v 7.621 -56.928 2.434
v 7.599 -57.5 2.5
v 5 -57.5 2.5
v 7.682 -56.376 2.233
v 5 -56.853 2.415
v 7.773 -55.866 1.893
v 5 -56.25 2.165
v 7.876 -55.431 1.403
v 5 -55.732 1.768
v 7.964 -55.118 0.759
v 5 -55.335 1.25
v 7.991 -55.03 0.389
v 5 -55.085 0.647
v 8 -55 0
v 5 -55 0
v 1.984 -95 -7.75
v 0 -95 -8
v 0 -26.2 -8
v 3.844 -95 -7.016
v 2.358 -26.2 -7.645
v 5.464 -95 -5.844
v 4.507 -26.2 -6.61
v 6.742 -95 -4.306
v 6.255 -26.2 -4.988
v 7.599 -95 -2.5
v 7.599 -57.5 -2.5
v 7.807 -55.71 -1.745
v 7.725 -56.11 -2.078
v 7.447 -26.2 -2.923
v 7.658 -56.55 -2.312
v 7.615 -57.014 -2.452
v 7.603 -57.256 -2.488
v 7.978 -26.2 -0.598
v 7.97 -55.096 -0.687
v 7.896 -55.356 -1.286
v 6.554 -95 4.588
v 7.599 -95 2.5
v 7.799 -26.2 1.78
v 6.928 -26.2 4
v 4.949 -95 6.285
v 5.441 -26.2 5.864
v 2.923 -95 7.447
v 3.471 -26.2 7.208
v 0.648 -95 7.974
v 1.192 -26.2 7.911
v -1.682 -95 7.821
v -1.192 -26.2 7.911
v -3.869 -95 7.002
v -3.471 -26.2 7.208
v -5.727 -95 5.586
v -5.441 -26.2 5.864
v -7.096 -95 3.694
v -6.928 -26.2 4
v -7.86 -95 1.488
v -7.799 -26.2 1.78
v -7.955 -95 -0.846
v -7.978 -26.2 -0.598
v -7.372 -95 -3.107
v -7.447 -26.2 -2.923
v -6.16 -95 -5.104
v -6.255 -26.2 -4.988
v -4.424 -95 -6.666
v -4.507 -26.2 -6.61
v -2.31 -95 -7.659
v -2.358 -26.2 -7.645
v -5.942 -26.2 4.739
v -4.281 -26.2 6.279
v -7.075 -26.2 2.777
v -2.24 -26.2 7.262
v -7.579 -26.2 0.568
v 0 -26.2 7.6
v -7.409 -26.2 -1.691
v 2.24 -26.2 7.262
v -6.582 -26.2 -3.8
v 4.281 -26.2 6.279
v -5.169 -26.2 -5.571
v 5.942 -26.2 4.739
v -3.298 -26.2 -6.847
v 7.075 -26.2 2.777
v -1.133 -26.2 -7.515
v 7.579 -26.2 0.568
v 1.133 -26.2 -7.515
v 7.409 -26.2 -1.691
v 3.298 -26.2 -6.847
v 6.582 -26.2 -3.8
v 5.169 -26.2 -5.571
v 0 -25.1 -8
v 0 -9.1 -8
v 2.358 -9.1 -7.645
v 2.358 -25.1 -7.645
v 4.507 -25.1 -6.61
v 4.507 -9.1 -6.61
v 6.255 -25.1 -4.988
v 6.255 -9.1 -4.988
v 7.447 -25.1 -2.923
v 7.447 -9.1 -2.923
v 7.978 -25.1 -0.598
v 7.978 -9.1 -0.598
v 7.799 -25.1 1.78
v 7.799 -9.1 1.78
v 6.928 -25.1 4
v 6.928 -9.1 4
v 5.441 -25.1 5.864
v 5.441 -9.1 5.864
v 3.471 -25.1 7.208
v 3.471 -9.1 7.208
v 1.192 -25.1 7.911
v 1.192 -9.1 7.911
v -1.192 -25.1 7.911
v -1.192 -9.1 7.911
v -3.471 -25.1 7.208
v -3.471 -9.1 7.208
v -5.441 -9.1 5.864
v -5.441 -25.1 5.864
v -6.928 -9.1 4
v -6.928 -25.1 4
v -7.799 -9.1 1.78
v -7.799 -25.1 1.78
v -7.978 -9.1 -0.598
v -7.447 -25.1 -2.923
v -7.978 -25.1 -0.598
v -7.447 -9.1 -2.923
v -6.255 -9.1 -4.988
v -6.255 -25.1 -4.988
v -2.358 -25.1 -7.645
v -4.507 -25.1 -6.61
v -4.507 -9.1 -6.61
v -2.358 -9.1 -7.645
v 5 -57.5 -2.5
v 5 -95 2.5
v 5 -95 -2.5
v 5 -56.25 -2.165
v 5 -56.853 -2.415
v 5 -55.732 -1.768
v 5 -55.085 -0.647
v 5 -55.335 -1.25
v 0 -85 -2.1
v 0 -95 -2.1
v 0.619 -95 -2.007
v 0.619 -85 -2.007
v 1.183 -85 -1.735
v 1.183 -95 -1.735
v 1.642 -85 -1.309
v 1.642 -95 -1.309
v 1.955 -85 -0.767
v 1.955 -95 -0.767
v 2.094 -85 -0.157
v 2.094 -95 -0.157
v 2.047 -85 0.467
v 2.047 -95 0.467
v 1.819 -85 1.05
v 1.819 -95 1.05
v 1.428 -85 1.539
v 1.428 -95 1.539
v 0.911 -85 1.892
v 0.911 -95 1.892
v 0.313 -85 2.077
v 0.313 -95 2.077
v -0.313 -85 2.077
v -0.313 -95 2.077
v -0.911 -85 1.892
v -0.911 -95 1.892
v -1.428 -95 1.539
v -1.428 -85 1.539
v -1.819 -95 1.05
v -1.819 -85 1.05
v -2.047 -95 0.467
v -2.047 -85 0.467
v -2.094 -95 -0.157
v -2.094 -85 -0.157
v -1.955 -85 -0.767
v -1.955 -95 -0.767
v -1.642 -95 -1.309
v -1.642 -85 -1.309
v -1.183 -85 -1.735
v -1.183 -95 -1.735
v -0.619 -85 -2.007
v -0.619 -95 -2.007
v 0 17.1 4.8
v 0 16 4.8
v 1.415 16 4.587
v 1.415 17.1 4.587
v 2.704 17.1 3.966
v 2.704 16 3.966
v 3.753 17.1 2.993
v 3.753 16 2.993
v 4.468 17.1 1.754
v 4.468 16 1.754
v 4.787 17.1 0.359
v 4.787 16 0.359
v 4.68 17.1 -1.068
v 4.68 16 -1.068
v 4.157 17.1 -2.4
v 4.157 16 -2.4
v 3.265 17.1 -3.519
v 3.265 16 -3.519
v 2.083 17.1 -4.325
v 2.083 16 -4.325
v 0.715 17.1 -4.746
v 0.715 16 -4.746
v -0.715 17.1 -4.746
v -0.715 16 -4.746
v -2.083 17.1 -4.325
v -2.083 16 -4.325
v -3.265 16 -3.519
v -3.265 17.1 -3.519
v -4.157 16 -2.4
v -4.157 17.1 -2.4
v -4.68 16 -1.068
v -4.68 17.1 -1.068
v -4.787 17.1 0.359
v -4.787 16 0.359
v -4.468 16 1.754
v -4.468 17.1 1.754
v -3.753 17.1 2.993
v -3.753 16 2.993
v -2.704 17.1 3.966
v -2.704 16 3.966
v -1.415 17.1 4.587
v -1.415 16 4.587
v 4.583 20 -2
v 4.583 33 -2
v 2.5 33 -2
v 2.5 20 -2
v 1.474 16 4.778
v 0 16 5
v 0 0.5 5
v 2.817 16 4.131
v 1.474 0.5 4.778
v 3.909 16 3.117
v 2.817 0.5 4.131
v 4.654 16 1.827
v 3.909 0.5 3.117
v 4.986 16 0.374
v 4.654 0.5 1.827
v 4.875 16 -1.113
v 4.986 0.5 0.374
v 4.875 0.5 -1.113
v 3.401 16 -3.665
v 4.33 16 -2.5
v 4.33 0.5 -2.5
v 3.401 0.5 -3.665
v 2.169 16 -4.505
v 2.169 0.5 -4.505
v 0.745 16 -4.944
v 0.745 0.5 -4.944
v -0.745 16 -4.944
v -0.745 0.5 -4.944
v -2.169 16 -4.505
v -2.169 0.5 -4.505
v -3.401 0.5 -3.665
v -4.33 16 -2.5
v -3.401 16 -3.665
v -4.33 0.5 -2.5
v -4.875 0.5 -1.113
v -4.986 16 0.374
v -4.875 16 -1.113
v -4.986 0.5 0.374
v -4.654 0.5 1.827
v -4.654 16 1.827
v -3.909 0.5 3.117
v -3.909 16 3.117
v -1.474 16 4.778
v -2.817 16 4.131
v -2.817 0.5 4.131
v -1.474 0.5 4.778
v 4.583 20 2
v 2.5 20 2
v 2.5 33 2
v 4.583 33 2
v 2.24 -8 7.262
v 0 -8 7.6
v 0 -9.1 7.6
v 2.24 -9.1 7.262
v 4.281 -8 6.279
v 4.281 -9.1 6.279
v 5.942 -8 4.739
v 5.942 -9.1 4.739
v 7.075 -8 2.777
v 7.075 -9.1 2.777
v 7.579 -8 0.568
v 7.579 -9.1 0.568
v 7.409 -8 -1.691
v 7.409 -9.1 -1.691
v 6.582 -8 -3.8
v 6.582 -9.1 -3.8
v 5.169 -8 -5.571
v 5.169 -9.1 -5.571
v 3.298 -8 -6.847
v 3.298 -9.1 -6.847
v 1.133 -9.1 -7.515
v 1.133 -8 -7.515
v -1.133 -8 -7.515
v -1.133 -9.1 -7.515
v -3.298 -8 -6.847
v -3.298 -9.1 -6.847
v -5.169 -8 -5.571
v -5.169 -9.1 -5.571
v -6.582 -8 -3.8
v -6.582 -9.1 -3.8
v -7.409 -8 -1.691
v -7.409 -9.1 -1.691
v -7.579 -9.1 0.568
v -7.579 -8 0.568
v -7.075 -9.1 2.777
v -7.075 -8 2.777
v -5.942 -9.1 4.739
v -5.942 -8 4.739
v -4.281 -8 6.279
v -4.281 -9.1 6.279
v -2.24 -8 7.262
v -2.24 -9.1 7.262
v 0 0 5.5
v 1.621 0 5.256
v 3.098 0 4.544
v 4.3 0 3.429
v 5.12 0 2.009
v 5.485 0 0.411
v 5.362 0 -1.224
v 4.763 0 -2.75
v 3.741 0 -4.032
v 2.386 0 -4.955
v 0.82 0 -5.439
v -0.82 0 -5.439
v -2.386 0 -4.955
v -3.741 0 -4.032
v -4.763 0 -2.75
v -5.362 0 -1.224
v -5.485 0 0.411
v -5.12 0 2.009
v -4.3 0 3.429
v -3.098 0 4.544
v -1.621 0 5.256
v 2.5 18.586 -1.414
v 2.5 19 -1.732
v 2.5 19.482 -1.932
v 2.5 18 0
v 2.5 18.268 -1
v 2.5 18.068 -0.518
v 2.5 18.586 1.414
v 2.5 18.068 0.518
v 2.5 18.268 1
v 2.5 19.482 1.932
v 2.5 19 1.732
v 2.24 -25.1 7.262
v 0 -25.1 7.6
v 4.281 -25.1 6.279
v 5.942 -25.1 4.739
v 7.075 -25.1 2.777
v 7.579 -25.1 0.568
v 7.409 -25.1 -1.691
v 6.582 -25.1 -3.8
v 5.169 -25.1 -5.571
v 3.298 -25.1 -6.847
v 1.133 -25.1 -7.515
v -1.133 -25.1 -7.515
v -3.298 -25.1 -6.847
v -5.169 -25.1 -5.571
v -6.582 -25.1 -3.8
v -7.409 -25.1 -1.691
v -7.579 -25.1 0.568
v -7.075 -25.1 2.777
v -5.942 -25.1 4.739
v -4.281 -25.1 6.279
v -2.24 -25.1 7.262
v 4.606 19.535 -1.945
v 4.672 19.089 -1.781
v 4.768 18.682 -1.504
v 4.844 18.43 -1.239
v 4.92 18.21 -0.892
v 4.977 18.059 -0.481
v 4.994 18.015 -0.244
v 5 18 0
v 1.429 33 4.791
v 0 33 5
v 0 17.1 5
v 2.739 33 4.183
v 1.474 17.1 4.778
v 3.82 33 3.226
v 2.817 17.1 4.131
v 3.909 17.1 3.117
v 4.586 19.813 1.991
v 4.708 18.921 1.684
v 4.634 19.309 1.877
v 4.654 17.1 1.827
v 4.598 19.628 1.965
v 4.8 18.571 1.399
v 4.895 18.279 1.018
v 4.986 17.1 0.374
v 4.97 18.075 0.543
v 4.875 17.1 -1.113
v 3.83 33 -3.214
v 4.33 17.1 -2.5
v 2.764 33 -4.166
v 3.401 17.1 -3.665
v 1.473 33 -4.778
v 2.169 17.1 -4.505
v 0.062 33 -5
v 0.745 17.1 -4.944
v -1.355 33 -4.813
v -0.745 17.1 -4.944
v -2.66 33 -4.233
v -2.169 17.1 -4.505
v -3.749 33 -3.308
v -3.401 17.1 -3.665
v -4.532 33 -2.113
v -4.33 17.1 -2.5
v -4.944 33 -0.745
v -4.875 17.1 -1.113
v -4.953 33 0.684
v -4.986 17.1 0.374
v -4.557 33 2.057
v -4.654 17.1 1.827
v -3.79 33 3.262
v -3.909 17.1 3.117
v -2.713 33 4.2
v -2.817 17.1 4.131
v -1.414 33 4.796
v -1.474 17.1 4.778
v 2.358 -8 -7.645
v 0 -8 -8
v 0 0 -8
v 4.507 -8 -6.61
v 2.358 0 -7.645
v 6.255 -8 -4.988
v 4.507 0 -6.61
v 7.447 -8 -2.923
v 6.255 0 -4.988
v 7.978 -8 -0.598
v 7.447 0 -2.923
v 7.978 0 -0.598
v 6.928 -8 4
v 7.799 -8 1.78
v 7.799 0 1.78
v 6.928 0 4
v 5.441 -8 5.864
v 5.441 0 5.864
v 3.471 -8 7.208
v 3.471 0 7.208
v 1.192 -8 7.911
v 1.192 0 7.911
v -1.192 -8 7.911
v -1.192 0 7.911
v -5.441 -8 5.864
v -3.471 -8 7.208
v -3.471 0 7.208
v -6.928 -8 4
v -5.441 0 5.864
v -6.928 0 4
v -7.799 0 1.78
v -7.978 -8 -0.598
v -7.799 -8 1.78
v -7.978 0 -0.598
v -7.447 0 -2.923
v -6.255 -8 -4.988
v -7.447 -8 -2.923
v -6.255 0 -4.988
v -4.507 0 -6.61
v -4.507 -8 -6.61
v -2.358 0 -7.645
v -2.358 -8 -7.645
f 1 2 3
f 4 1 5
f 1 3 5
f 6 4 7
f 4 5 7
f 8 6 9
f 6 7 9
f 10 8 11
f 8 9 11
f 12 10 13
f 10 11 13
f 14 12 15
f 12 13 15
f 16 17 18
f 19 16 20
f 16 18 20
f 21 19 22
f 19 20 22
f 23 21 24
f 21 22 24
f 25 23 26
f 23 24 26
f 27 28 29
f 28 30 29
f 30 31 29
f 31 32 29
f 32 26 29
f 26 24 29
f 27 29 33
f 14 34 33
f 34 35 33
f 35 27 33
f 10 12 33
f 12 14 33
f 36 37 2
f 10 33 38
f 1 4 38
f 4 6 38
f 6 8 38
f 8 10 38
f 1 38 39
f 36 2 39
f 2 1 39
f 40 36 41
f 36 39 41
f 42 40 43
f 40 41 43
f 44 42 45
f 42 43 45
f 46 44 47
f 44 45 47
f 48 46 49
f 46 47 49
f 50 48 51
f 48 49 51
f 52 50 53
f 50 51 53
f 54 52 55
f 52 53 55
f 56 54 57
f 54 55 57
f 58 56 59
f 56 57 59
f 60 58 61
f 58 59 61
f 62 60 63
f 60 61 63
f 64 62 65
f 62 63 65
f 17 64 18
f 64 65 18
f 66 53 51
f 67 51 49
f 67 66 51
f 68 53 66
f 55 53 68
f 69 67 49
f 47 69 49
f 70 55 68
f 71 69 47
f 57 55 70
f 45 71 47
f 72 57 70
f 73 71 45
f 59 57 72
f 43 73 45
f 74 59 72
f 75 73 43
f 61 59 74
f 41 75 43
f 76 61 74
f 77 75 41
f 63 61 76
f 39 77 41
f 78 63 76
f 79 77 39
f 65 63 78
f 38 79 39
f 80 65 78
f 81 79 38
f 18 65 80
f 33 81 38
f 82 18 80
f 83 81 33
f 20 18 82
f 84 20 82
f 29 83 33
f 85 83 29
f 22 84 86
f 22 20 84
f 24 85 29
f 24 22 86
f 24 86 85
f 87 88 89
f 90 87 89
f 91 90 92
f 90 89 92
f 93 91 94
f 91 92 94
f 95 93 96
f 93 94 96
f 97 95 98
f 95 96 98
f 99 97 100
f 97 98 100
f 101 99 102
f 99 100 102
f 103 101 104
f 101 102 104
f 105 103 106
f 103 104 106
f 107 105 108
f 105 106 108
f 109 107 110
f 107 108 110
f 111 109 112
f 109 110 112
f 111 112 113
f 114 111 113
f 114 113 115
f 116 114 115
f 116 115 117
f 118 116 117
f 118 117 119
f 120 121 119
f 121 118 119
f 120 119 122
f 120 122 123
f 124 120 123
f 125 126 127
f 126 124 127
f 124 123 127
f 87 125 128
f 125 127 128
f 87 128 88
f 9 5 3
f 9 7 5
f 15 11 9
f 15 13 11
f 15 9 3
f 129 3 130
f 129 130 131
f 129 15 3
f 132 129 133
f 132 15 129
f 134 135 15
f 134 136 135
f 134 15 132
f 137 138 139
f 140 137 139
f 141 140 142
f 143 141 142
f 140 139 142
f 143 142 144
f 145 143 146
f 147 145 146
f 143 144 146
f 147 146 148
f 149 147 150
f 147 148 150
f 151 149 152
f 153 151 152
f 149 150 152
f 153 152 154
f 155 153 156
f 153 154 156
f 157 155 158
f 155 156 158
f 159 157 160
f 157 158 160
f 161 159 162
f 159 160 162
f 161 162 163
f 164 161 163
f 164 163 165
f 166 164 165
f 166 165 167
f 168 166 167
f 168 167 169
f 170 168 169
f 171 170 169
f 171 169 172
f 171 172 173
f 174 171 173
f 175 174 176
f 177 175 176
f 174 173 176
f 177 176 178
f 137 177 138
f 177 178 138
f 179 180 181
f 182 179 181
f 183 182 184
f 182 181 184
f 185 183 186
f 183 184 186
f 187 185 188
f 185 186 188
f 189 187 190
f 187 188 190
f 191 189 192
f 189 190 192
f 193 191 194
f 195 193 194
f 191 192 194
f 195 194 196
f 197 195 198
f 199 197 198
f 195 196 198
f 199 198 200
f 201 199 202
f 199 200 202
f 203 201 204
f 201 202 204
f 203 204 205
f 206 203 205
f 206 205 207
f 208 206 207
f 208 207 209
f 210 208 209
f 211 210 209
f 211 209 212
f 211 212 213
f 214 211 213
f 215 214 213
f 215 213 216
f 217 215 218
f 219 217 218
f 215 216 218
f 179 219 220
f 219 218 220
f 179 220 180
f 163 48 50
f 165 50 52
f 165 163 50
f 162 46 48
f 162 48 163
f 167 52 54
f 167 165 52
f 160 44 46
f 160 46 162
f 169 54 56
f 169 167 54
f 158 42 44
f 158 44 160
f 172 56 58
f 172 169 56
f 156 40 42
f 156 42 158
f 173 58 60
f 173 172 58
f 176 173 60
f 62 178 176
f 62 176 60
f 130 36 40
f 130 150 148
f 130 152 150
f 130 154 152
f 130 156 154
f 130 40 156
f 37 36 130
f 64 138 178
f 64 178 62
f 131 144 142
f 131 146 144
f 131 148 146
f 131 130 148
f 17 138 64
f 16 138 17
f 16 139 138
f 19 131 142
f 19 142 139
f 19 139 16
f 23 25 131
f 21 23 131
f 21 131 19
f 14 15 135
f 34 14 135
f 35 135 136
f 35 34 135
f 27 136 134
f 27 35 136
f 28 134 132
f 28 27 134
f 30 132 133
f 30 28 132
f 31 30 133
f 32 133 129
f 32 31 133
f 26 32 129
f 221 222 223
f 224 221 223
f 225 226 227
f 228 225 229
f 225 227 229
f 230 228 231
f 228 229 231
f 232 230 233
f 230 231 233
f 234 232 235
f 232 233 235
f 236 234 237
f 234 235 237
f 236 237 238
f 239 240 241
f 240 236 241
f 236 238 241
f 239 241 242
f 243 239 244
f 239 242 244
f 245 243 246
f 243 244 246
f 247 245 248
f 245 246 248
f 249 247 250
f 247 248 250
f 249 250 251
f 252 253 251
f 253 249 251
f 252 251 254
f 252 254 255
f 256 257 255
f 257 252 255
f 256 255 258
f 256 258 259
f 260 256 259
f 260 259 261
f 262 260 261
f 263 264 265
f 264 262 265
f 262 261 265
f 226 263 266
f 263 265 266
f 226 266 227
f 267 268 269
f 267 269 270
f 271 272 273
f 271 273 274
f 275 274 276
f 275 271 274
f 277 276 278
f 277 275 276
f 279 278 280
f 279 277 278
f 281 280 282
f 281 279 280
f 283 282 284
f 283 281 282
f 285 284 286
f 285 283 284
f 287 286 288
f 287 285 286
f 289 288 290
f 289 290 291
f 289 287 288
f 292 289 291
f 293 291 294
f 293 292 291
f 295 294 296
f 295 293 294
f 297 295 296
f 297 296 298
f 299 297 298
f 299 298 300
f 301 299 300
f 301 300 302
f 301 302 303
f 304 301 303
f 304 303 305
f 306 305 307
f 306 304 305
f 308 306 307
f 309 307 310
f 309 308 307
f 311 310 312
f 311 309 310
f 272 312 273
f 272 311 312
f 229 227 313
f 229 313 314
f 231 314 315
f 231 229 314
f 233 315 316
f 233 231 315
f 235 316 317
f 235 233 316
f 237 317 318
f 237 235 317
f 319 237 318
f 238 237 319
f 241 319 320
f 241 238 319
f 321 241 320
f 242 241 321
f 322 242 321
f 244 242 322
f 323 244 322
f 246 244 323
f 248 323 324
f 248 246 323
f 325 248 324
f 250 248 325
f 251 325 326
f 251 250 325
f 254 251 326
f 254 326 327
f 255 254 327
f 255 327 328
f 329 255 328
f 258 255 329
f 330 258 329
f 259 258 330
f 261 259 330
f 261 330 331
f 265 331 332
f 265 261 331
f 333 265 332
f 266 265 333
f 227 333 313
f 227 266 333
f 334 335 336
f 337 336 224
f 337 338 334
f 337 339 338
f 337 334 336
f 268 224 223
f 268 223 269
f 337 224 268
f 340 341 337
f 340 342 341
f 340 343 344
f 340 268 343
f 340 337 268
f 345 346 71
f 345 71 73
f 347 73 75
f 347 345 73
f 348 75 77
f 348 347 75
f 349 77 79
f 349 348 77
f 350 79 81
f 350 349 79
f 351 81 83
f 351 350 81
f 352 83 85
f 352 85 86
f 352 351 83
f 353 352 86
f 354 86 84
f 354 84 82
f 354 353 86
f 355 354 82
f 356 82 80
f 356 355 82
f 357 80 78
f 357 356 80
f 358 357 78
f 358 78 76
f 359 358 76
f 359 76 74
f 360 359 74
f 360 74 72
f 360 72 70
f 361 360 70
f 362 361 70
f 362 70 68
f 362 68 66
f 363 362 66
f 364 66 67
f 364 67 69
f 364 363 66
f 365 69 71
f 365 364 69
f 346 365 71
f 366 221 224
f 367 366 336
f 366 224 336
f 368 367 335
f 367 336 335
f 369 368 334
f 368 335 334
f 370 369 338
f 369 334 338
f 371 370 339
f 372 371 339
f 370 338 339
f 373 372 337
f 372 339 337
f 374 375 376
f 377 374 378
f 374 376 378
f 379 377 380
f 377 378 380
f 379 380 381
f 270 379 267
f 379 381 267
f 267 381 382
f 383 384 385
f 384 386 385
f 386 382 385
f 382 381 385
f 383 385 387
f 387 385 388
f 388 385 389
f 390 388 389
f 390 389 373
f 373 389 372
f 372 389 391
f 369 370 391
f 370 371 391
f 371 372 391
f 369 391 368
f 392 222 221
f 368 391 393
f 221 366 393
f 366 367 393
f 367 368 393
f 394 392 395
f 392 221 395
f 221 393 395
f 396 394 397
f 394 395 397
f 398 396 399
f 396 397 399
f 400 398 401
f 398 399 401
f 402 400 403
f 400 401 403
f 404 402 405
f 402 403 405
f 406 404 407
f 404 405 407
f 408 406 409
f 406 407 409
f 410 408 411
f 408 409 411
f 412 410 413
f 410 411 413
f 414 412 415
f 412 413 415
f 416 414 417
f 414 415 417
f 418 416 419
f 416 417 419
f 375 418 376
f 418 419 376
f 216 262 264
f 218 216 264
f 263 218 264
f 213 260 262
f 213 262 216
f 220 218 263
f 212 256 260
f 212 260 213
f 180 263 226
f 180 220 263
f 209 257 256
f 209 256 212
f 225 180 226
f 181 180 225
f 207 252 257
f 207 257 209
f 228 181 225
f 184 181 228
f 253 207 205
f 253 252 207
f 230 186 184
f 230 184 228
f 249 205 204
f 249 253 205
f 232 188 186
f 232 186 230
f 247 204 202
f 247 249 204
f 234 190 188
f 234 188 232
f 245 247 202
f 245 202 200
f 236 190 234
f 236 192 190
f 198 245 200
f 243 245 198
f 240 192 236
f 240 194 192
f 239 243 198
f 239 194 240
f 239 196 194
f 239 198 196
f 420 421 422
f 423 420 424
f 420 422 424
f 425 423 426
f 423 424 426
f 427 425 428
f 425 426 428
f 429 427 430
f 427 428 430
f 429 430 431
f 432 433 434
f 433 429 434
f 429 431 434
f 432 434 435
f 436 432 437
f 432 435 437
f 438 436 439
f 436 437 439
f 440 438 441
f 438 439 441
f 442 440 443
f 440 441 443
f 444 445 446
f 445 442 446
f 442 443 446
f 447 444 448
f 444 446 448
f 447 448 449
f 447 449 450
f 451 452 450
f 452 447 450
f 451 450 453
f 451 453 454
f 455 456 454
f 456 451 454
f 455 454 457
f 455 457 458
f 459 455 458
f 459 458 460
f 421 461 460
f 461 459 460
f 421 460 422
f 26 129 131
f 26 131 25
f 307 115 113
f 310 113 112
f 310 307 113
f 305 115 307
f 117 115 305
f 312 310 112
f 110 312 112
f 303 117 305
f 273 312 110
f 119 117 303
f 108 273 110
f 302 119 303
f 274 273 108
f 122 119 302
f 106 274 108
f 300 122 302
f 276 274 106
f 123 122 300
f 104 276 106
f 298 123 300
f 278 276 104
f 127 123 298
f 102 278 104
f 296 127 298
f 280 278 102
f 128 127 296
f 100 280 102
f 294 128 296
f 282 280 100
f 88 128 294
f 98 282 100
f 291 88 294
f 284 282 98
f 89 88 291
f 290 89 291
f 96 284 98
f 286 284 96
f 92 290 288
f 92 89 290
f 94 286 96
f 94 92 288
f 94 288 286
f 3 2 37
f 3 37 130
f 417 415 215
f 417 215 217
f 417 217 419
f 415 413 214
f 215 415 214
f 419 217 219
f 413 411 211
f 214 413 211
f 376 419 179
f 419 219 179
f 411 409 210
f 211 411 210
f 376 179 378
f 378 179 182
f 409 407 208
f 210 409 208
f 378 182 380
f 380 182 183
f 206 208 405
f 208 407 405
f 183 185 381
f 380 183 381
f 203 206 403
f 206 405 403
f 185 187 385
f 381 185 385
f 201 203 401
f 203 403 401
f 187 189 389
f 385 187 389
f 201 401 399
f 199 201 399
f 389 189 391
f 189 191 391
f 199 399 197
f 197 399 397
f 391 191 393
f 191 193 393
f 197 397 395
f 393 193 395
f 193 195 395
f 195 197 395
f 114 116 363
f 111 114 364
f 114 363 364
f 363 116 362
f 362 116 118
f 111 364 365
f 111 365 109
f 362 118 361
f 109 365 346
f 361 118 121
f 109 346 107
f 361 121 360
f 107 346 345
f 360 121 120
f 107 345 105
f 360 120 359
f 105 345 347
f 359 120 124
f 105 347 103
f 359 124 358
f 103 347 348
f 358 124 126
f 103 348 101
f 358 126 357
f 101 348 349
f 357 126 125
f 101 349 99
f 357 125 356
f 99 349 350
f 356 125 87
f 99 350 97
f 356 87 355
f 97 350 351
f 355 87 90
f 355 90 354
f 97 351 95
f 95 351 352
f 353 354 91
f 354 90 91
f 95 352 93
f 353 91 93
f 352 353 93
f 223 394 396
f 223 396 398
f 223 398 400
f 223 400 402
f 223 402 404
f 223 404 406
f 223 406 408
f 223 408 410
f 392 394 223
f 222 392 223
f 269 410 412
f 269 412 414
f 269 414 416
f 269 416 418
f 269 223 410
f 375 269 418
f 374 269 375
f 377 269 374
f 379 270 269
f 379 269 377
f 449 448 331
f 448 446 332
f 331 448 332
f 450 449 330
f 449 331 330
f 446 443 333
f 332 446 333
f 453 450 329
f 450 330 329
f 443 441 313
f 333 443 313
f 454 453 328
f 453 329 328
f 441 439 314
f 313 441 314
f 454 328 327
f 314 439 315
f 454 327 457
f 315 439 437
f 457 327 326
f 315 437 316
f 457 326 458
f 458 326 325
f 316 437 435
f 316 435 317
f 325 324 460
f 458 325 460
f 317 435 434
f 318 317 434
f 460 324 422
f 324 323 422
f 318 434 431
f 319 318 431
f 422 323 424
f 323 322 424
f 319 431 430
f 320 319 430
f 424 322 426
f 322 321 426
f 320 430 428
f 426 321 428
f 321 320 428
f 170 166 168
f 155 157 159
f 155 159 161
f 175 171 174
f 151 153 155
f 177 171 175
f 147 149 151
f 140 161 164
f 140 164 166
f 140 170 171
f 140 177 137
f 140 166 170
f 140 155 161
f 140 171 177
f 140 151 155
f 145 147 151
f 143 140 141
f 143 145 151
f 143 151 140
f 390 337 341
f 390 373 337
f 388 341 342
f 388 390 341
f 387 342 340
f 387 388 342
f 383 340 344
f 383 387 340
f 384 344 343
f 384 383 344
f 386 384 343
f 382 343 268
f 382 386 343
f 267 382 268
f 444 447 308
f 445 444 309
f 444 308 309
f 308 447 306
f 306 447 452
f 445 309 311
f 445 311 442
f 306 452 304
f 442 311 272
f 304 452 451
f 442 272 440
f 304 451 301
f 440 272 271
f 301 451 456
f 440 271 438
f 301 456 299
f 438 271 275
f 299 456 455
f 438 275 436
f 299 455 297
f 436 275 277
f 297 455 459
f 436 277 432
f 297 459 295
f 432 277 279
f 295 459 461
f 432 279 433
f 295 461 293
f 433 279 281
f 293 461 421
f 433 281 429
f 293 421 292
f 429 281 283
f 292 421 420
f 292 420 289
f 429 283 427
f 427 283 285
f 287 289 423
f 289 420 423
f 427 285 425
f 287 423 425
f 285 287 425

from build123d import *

# Parameters (mm, degrees)
SKETCH1_R               = 5
BOSS_EXTRUDE1_DEPTH     = 33
SKETCH2_R               = 8
BOSS_EXTRUDE2_DEPTH     = 95
CUT_EXTRUDE1_START      = -8
SKETCH3_OUTSIDE_W       = 43.996
SKETCH3_OUTSIDE_H       = 43.996
SKETCH3_OUTSIDE_R       = 7.6
CUT_EXTRUDE1_DEPTH      = 1.1
CUT_EXTRUDE2_START      = -25.1
SKETCH3_2_OUTSIDE_W     = 43.996
SKETCH3_2_OUTSIDE_H     = 43.996
SKETCH3_2_OUTSIDE_R     = 7.6
CUT_EXTRUDE2_DEPTH      = 1.1
CUT_EXTRUDE3_START      = 16
SKETCH4_OUTSIDE_W       = 43.996
SKETCH4_OUTSIDE_H       = 43.996
SKETCH4_OUTSIDE_R       = 4.8
CUT_EXTRUDE3_DEPTH      = 1.1
SKETCH5_R               = 2.1
CUT_EXTRUDE4_DEPTH      = 10
CUT_EXTRUDE5_START      = -15
CUT_EXTRUDE5_DEPTH      = 15
FILLET1_R               = 2
CUT_EXTRUDE6_DEPTH      = 129.499027333
CUT_EXTRUDE6_DEPTH_BACK = 40
FILLET2_R               = 2.5
CHAMFER1_SIZE           = 0.5


with BuildPart() as part:
    # Sketch1 → Boss-Extrude1 (new body)
    with BuildSketch(Plane(origin=(0, 0, 0), x_dir=(1, 0, 0), z_dir=(0, 1, 0))):
        with Locations(Location((0, 0, 0), (0, 0, 270))):
            Circle(SKETCH1_R)
    extrude(amount=BOSS_EXTRUDE1_DEPTH)

    # Sketch2 → Boss-Extrude2 (add)
    with BuildSketch(Plane.XZ):
        with Locations(Location((0, 0, 0), (0, 0, 270))):
            Circle(SKETCH2_R)
    extrude(amount=BOSS_EXTRUDE2_DEPTH)

    # Sketch3 outside → Cut-Extrude1 (cut)
    with BuildSketch(Plane(origin=(0, 0, 0), x_dir=(1, 0, 0), z_dir=(0, 1, 0)).offset(CUT_EXTRUDE1_START)):
        Rectangle(SKETCH3_OUTSIDE_W, SKETCH3_OUTSIDE_H)
        with Locations(Location((0, 0, 0), (0, 0, 270))):
            Circle(SKETCH3_OUTSIDE_R, mode=Mode.SUBTRACT)
    extrude(amount=-CUT_EXTRUDE1_DEPTH, mode=Mode.SUBTRACT)

    # Sketch3<2> outside → Cut-Extrude2 (cut)
    with BuildSketch(Plane(origin=(0, 0, 0), x_dir=(1, 0, 0), z_dir=(0, 1, 0)).offset(CUT_EXTRUDE2_START)):
        Rectangle(SKETCH3_2_OUTSIDE_W, SKETCH3_2_OUTSIDE_H)
        with Locations(Location((0, 0, 0), (0, 0, 270))):
            Circle(SKETCH3_2_OUTSIDE_R, mode=Mode.SUBTRACT)
    extrude(amount=-CUT_EXTRUDE2_DEPTH, mode=Mode.SUBTRACT)

    # Sketch4 outside → Cut-Extrude3 (cut)
    with BuildSketch(Plane(origin=(0, 0, 0), x_dir=(1, 0, 0), z_dir=(0, 1, 0)).offset(CUT_EXTRUDE3_START)):
        Rectangle(SKETCH4_OUTSIDE_W, SKETCH4_OUTSIDE_H)
        with Locations(Location((0, 0, 0), (0, 0, 270))):
            Circle(SKETCH4_OUTSIDE_R, mode=Mode.SUBTRACT)
    extrude(amount=CUT_EXTRUDE3_DEPTH, mode=Mode.SUBTRACT)

    # Sketch5 → Cut-Extrude4 (cut)
    with BuildSketch(Plane.XZ.offset(95)):
        with Locations(Location((0, 0, 0), (0, 0, 270))):
            Circle(SKETCH5_R)
    extrude(amount=-CUT_EXTRUDE4_DEPTH, mode=Mode.SUBTRACT)

    # Sketch6 → Cut-Extrude5 (cut)
    with BuildSketch(Plane(origin=(0, 33, 0), x_dir=(1, 0, 0), z_dir=(0, 1, 0)).offset(CUT_EXTRUDE5_START)):
        with BuildLine():
            Line((4.582575695, 2), (2.5, 2))
            Line((2.5, 2), (2.5, -2))
            Line((2.5, -2), (4.582575695, -2))
            ThreePointArc((4.582575695, -2), (5, 0), (4.582575695, 2))
        make_face()
    extrude(amount=CUT_EXTRUDE5_DEPTH, mode=Mode.SUBTRACT)

    # Fillet1
    fillet1_edges = [part.edges().sort_by_distance(p)[0] for p in [
        (3.541287847, 18, 2),
        (3.541287847, 18, -2),
    ]]
    fillet(fillet1_edges, radius=FILLET1_R - 0.0001)  # a hair under: the kernel refuses the full size

    # Sketch7 → Cut-Extrude6 (cut, two sides: drawn at the far end of the back side and taken through both)
    with BuildSketch(Plane.XZ.offset(95).offset(-CUT_EXTRUDE6_DEPTH_BACK)):
        Polygon((55.20729194, 2.5), (7.599342077, 2.5), (5, 2.5), (5, -2.5), (7.599342077, -2.5), (55.20729194, -2.5), (150.423191666, -2.5), (150.423191666, 2.5), align=None)
    extrude(amount=CUT_EXTRUDE6_DEPTH + CUT_EXTRUDE6_DEPTH_BACK, mode=Mode.SUBTRACT)

    # Fillet2
    fillet2_edges = [part.edges().sort_by_distance(p)[0] for p in [
        (6.299671038, -55, 2.5),
        (6.299671038, -55, -2.5),
    ]]
    fillet(fillet2_edges, radius=FILLET2_R - 0.0001)  # a hair under: the kernel refuses the full size

    # Chamfer1
    chamfer1_edges = [part.edges().sort_by_distance(p)[0] for p in [
        (0, 0, -5),
    ]]
    chamfer(chamfer1_edges, length=CHAMFER1_SIZE)


solid = part.part
